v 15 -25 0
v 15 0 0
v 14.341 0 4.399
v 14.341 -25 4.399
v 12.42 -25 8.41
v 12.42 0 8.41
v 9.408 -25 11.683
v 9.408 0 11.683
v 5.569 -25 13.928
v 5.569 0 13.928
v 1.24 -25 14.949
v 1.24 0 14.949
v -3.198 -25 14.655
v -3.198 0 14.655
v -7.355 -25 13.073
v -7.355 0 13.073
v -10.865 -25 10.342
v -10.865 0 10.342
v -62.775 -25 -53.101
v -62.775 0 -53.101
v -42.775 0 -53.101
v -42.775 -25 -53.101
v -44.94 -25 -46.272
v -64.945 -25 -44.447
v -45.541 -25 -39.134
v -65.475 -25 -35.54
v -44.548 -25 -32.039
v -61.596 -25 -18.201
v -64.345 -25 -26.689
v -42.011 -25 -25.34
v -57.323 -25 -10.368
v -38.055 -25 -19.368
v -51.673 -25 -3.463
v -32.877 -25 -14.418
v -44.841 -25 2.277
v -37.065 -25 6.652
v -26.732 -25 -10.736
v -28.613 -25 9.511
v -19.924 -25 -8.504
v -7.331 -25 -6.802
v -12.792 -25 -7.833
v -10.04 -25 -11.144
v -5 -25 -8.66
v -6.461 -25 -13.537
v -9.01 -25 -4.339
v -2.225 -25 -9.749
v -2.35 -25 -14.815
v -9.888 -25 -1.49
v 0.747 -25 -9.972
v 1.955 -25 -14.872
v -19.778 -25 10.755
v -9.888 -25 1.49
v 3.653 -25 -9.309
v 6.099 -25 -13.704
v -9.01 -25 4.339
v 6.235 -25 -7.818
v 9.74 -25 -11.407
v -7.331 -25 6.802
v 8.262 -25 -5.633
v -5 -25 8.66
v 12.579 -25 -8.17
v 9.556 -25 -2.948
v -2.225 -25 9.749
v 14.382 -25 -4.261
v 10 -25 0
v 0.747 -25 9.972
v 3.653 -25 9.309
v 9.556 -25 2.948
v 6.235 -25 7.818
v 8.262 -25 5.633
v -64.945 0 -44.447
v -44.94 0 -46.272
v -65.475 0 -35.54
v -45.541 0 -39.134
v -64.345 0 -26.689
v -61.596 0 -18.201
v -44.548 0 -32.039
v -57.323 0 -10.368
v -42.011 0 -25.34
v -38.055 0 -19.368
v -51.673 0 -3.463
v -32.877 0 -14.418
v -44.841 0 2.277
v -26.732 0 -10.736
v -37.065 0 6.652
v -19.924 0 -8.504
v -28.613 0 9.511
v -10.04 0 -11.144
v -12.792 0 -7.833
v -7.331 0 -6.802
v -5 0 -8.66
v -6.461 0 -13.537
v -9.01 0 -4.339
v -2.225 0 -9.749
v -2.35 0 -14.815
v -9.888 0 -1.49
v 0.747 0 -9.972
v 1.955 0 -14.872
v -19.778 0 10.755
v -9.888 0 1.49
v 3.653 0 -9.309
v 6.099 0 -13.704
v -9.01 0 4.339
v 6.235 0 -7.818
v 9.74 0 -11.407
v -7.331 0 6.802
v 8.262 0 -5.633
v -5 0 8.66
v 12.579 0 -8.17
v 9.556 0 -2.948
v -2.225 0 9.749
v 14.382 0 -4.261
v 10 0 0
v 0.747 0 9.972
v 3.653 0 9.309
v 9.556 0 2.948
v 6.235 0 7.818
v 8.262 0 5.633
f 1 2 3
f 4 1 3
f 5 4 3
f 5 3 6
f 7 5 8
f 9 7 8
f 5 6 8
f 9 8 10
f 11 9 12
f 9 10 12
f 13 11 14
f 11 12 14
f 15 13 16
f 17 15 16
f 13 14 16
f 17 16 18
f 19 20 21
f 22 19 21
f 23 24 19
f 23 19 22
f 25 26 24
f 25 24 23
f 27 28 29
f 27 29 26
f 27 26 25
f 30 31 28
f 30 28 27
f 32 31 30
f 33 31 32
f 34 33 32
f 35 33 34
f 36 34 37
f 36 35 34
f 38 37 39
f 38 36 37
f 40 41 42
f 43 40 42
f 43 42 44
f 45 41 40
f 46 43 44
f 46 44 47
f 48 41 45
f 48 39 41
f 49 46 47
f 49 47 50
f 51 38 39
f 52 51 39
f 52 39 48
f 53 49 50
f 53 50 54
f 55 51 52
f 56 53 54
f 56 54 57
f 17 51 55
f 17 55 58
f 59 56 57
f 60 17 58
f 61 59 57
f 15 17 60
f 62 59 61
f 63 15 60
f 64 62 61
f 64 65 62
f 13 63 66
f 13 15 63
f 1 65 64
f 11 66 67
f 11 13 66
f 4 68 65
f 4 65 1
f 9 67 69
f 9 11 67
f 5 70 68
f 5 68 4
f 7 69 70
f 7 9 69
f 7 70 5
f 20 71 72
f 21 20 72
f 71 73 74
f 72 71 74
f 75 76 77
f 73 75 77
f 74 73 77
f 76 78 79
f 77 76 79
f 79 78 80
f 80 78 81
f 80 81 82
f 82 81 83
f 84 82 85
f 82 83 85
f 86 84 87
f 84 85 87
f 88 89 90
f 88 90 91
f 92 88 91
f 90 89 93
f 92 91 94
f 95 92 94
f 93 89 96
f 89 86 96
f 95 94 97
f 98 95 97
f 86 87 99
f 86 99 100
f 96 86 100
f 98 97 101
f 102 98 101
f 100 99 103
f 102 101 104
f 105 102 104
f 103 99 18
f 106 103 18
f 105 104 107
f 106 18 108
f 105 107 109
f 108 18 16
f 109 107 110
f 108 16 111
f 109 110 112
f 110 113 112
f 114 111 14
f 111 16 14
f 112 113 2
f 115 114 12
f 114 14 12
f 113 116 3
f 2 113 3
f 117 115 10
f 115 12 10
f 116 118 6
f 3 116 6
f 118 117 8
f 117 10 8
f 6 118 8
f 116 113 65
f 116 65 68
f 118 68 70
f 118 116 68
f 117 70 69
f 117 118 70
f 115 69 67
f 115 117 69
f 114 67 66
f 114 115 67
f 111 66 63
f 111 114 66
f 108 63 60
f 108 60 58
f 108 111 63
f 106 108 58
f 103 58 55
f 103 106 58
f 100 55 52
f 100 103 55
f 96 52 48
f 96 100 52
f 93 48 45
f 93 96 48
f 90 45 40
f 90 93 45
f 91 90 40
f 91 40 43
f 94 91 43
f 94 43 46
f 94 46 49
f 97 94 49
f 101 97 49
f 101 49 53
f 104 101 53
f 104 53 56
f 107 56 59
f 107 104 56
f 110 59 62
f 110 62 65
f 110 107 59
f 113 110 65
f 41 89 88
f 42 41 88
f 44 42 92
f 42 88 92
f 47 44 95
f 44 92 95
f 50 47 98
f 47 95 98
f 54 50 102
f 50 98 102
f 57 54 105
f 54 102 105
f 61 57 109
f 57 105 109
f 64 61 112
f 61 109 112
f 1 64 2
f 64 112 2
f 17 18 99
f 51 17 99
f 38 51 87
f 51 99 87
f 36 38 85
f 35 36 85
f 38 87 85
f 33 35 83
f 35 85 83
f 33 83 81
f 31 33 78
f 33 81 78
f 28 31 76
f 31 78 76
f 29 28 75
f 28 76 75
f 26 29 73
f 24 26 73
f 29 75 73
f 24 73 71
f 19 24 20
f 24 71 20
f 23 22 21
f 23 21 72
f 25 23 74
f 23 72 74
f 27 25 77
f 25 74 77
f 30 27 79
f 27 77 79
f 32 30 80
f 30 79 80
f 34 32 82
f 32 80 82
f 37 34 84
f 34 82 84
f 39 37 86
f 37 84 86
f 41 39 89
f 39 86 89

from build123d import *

# Parameters (mm, degrees)
F0_R     = 10
F1_DEPTH = 25


with BuildPart() as f1:
    # F0 (on Front) → F1 (new body)
    with BuildSketch(Plane.XZ):
        with BuildLine():
            ThreePointArc((-12.792136, -7.833343), (-14.916387, 1.581581), (-10.865039, 10.341708))
            ThreePointArc((-10.865039, 10.341708), (-54.658742, -6.783931), (-62.775411, -53.101266))
            Line((-62.775411, -53.101266), (-42.775411, -53.101266))
            ThreePointArc((-42.775411, -53.101266), (-40.200011, -22.243392), (-12.792136, -7.833343))
        make_face()
        with BuildLine():
            ThreePointArc((-12.792136, -7.833343), (4.069273, -14.437487), (15, 0))
            ThreePointArc((15, 0), (5.56886, 13.92795), (-10.865039, 10.341708))
            ThreePointArc((-10.865039, 10.341708), (-14.916387, 1.581581), (-12.792136, -7.833343))
        make_face()
        Circle(F0_R, mode=Mode.SUBTRACT)
    extrude(amount=F1_DEPTH)


solid = f1.part
